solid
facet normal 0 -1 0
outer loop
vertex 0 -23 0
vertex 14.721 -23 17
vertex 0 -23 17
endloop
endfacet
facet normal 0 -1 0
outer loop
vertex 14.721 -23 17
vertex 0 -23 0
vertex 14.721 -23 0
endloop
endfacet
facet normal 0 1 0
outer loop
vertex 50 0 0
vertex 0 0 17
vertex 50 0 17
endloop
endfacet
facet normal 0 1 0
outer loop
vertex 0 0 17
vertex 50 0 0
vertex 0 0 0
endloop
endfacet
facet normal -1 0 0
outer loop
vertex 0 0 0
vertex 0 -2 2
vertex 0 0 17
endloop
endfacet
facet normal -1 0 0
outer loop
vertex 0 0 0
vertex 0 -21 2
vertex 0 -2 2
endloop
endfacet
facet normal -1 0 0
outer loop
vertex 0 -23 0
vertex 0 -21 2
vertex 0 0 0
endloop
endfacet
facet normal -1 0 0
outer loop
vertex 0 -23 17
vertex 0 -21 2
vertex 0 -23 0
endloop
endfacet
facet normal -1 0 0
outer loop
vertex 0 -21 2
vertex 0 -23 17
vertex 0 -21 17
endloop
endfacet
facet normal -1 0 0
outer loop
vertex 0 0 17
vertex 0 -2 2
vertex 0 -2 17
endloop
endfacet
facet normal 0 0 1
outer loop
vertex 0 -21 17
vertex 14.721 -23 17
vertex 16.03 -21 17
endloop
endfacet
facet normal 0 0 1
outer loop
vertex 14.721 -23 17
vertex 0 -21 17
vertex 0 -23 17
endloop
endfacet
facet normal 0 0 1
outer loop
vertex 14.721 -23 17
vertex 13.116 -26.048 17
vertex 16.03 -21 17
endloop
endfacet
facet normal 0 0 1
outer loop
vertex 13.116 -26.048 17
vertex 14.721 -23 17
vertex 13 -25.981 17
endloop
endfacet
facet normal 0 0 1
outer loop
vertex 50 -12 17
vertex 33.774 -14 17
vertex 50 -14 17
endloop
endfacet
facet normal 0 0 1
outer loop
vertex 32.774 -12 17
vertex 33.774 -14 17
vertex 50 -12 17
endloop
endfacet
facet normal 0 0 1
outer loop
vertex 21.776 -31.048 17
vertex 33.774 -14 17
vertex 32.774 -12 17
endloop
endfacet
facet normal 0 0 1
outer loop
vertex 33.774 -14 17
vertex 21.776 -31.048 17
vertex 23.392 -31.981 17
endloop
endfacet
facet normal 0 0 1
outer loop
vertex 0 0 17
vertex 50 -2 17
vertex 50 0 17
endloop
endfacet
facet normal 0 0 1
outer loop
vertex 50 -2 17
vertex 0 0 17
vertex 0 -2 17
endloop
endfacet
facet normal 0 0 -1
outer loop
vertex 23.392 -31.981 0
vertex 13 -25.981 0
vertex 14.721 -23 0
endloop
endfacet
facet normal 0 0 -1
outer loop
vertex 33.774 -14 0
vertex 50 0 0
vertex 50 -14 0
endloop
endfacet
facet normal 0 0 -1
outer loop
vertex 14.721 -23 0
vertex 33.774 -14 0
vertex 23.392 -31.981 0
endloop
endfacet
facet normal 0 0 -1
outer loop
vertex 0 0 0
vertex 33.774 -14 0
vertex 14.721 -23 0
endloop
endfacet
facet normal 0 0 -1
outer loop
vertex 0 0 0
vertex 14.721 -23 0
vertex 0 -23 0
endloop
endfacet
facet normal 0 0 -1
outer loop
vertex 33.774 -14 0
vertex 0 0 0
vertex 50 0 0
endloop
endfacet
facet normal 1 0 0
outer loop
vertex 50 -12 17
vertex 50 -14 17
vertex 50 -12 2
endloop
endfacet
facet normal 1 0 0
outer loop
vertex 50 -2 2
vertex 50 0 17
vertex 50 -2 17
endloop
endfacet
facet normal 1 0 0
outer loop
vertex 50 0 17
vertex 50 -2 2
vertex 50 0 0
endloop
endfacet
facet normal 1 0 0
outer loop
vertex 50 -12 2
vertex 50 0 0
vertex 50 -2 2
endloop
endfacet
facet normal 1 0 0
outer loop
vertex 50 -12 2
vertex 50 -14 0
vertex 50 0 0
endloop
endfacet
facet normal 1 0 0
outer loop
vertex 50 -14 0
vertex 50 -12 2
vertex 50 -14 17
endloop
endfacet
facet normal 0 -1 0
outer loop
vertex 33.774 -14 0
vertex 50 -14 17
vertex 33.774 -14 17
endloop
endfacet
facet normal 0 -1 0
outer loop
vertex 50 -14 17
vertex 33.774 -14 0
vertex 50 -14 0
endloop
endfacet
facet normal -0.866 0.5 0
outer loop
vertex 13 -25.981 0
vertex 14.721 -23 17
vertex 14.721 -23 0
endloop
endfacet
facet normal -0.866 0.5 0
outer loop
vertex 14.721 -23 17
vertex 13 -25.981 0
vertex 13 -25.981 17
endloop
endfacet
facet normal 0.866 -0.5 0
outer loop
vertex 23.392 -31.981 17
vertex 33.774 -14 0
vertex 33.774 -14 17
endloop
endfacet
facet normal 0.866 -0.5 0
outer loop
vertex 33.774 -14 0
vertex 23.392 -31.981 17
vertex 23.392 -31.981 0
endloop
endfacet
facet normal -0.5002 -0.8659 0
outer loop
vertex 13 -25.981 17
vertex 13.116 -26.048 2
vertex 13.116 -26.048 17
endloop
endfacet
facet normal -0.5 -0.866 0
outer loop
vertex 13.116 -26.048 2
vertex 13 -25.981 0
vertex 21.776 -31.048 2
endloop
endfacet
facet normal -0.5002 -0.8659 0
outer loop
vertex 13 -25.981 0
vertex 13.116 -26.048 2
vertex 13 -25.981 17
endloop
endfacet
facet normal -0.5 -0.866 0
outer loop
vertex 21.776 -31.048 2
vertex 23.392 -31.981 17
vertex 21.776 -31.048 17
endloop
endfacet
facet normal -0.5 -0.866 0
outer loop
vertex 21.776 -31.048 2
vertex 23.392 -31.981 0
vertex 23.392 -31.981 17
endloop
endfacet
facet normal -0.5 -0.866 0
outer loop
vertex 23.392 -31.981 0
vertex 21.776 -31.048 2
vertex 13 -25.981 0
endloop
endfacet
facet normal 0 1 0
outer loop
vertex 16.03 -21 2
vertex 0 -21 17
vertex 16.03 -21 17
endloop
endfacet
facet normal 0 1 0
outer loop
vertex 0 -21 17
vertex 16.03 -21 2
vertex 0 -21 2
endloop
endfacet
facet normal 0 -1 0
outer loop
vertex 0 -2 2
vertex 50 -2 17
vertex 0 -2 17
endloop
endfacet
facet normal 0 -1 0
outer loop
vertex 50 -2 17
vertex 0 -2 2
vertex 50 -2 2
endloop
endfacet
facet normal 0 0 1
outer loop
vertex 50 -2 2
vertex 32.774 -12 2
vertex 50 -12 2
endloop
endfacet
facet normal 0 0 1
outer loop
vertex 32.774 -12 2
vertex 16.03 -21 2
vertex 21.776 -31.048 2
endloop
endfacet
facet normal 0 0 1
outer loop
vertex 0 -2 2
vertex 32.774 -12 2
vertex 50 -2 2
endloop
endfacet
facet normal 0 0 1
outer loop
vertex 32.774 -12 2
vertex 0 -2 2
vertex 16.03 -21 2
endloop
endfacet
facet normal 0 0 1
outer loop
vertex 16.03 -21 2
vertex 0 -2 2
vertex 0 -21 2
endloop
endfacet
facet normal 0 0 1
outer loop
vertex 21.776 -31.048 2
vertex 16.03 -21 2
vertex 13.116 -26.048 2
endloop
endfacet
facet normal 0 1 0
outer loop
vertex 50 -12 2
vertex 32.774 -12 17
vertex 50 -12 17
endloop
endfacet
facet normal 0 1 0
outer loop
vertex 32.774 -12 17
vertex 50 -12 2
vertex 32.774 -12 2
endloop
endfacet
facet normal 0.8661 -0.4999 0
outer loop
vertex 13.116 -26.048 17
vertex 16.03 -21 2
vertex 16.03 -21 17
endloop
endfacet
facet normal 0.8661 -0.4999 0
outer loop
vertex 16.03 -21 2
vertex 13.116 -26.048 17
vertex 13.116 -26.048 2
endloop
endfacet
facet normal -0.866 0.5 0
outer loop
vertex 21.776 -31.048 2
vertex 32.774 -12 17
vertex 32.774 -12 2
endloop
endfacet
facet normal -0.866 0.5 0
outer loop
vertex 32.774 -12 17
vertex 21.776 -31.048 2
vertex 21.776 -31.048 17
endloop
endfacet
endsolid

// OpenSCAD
back_len=25;
front_len=25;
deep = 17;

height=30;

position=28;

rotation=30;

//all lengths are +1mm to allow some wiggling
keyboard_thickness_front= 10;
keyboard_thickness_back = 19;
tablet_thickness = 10;

module holder(){
difference(){
    union(){
cube([back_len,deep,keyboard_thickness_back+4]);
translate([back_len,0,0])cube([front_len,deep,keyboard_thickness_front+4]);
 translate([position,0,0])rotate([0,-30,0])cube([tablet_thickness+2,deep,height]);
    }

translate([-1,2,2])cube([back_len+2,deep,keyboard_thickness_back]);

translate([back_len-1,2,2])cube([front_len+4,deep,keyboard_thickness_front]);

translate([position-1,2,2])rotate([0,-30,0])cube([tablet_thickness,deep,height+4]);
    
}
}

rotate([90,0,0])holder();
